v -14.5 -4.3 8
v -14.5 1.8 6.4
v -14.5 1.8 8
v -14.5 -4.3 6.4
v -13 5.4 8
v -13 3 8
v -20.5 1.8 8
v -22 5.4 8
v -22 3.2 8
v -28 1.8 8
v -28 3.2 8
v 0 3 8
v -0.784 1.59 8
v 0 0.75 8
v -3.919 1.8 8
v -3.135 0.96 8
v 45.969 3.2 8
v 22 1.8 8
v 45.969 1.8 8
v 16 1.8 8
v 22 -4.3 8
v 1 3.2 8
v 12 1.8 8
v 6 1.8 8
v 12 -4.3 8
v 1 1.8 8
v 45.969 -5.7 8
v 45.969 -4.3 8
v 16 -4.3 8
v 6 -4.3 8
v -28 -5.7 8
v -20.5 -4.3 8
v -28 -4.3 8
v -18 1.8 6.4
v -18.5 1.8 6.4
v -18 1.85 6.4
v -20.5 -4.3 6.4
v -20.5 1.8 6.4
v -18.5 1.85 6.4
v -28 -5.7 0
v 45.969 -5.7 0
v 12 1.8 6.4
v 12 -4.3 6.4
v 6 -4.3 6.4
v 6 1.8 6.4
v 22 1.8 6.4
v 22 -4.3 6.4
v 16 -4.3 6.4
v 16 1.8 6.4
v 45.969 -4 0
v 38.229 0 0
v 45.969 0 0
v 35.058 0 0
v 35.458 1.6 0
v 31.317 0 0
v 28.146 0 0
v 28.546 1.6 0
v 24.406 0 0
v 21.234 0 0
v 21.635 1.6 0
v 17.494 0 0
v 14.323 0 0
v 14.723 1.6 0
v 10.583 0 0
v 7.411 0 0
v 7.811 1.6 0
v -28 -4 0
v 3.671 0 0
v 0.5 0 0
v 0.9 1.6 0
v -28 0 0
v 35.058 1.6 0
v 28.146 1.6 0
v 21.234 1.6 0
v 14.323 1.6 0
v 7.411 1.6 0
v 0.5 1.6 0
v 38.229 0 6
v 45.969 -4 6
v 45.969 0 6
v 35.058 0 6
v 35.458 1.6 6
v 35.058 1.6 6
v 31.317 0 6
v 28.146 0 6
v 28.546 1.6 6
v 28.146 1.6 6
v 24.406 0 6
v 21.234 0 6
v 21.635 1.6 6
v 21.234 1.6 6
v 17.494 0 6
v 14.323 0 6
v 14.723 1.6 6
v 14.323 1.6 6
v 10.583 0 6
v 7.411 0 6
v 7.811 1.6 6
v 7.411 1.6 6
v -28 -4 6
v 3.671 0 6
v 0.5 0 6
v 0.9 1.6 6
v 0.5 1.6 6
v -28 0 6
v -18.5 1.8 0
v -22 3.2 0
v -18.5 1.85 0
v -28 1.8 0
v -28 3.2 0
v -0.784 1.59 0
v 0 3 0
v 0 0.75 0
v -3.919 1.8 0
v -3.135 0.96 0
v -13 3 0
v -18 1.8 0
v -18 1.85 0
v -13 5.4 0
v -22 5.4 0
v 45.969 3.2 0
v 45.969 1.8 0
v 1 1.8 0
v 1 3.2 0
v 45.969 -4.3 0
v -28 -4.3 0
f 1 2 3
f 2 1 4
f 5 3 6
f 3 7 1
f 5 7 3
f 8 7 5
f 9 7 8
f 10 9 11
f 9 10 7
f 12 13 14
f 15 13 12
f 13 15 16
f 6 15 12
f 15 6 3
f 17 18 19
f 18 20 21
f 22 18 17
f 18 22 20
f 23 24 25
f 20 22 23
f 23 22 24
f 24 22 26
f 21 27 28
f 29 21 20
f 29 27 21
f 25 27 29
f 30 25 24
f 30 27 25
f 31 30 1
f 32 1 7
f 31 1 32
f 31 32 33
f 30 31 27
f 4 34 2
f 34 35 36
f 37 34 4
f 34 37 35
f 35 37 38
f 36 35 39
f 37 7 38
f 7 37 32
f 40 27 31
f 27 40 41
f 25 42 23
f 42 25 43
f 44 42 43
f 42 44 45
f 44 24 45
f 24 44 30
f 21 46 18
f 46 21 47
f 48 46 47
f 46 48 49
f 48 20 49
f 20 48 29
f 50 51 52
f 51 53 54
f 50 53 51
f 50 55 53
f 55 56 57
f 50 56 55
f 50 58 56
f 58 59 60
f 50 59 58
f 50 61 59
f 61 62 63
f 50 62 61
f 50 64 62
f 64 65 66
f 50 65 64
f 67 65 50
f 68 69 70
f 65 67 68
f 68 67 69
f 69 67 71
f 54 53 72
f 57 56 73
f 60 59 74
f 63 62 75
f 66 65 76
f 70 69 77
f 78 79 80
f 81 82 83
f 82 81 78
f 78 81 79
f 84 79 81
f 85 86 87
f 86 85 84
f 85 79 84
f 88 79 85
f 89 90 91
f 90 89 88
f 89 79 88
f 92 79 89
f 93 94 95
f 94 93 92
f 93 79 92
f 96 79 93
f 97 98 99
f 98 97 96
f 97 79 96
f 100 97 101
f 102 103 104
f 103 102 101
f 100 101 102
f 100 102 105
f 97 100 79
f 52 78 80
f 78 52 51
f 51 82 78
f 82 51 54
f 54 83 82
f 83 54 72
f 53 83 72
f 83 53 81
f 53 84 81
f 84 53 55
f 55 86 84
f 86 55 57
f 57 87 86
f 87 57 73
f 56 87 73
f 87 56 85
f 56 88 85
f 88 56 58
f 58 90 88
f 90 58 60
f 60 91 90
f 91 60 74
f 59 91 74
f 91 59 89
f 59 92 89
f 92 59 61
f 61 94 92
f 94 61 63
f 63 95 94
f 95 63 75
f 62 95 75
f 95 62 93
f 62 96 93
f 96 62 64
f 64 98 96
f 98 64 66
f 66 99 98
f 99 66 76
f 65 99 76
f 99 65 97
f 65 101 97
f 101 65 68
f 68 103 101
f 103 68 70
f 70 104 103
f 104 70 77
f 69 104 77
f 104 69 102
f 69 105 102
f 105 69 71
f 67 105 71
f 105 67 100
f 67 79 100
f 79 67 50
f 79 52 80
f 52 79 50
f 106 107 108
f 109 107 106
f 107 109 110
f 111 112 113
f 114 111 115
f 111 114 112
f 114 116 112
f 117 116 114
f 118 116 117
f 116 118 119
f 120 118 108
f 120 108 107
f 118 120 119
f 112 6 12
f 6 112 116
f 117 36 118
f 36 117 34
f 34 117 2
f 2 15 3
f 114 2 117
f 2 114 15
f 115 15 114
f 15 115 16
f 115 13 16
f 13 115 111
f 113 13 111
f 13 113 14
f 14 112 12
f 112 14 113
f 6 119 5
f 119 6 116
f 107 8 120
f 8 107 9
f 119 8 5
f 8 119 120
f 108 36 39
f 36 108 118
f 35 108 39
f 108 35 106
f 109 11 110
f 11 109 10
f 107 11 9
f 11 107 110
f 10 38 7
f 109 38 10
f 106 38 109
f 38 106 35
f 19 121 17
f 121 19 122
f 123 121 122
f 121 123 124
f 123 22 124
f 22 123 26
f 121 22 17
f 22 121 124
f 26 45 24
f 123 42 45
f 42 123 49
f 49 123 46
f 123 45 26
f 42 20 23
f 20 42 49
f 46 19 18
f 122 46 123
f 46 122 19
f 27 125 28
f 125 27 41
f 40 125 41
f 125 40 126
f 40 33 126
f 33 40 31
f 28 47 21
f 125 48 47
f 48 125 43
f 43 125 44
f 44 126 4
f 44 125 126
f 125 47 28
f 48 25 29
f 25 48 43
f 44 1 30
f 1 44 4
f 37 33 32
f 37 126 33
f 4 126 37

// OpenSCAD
// pip-ratchet-coupon — print this first. One pawl (the production cross-section
// and profile, on the shared pawl_profile()) engaging a linear rack (the
// production tooth_profile() unrolled at the root circle), in a channel that
// confines the loose strip. Slide the rack +x (the arrow direction on the
// demonstrator): it should click and the pawl ride up each tooth; slide it −x:
// it must lock dead. No geometry is copied — the profiles come from the entry
// design, so what you tune here is what ships.
//
// WHAT TO TUNE: pawl_t, in 0.1 steps, via the sweep plate —
//   ./scripts/render.sh pip-ratchet --sweep pawl_t=0.9:1.5:0.1
// Stiffness (click force) scales ~ t³ and ride-up stress ~ t: thicker clicks
// harder and lives longer, thinner feels lighter. If the strip welds into the
// channel, raise k_xy by 0.05 in the entry file and reprint both. See NOTES.md
// "Print this first". Overrides sit below the include (OpenSCAD resolves
// top-level variables last-assignment-wins); "coupon" has no dispatch branch,
// so the demonstrator itself renders nothing here.
include <pip-ratchet.scad>
part = "coupon";

/* [Coupon] */
// Teeth on the rack strip — enough clicks to judge the feel
coupon_teeth = 6;
// Rack strip body thickness below the root line (mm)
rack_body = 4;
// Rack strip height (mm) — the pawl keeps the production 8 mm section
rack_h = 6;
// Guide rail thickness (mm)
rail_t = 1.4;
// Far-rail sliding clearance (mm) — guidance only; the fit under test is the
// tooth-tip-to-wall web_clr, which is the production number
rail_gap = 0.3;
// Near rail resumes this far ahead of the nose face (mm)
nose_clear = 1;
// Joint offset (mm): keeps fixture faces that meet the pawl off its planes
joint_e = 0.05;

// ---- derived (linear unroll at the root circle) ------------------------
pitch_mm = tooth_pitch_arc();
x_w    = lock_gap;                // first tooth wall, lock_gap AHEAD (+x) of
                                   // the nose face — sliding −x drives the wall
                                   // onto the face (lock); +x presents ramps
x_rack0 = -block_back_u - 6;      // back margin reaches past the block zone
x_rack1 = x_w + coupon_teeth * pitch_mm + 4;
web_y  = web_in - r_root;         // beam underside plane = channel wall (1.8)
block_y_out = beam_out - r_root + 2.4;

function rack_pts() =
  let (teeth_pts = [ for (j = [0 : coupon_teeth - 1], p = tooth_profile())
                       [ x_w + j * pitch_mm + p[0], p[1] - r_root ] ])
  concat([[x_rack0, -rack_body], [x_rack0, 0]],
         teeth_pts,
         [[x_rack1, 0], [x_rack1, -rack_body]]);

function pawl_pts_linear() =
  [ for (p = pawl_profile()) [ -p[0], p[1] - r_root ] ];

module coupon() {
  assert(rack_h + z_tol < pawl_w, "bridge would sit above the pawl tops");
  assert(x_rack0 < -block_back_u - 2, "rack shorter than the pawl block zone");
  // the loose rack strip — slides in the channel, prints on the bed
  linear_extrude(rack_h) polygon(rack_pts());
  // the pawl, full production section, nose face at x = 0
  linear_extrude(pawl_w) polygon(pawl_pts_linear());
  // clamping block burying the pawl root (mirrors the demonstrator's sector).
  // Its underside sits joint_e ABOVE the pawl's underside plane: flush, the
  // two coincide with the rail's underside too, and the Manifold backend
  // unions three coplanar faces into a non-manifold seam (issue #668 CI).
  translate([-block_back_u, web_y + joint_e, 0])
    cube([block_back_u - block_front_u, block_y_out - web_y - joint_e, pawl_w]);
  // tooth-side channel wall, interrupted by the pawl: behind the block (its
  // end stops 0.5 mm short of the pawl's root face, INSIDE the block's x-span
  // — a tangent face-only contact leaves the fixture as two shells, and an
  // end flush on the pawl's underside is the same coplanar seam), and ahead of
  // the nose; between them the pawl's own underside is the wall
  translate([x_rack0, web_y, 0])
    cube([-(pawl_l + 0.5) - x_rack0, rail_t, pawl_w]);
  translate([nose_clear, web_y, 0])
    cube([x_rack1 - nose_clear, rail_t, pawl_w]);
  // far-side rail: the click reaction pushes the strip against this
  translate([x_rack0, -rack_body - rail_gap - rail_t, 0])
    cube([x_rack1 - x_rack0, rail_t, pawl_w]);
  // z-confinement bridges over the strip, 2 layers above it (z_tol) —
  // printed between the rails; they reach 0.2 mm INTO the near-rail band (or
  // the block, for the one behind the pawl) so every fixture joint is
  // volumetric, not face-tangent. The −20.5 bridge lands over the block's clamp
  // zone — frame-welds to frame, clear of the flexure (which starts at
  // x = −block_front_u = −13) — and is what ties the far-rail/ahead-rail group
  // to the pawl/block group, so the fixture is ONE body.
  // (−20.5, not −20: its faces stay off the pawl's 1 mm-spaced beam vertices)
  for (bx = [-20.5, 6, 16])
    translate([bx, -rack_body - rail_gap - rail_t, rack_h + z_tol])
      cube([6, web_y + rack_body + rail_gap + rail_t + 0.2,
            pawl_w - rack_h - z_tol]);
}

coupon();
